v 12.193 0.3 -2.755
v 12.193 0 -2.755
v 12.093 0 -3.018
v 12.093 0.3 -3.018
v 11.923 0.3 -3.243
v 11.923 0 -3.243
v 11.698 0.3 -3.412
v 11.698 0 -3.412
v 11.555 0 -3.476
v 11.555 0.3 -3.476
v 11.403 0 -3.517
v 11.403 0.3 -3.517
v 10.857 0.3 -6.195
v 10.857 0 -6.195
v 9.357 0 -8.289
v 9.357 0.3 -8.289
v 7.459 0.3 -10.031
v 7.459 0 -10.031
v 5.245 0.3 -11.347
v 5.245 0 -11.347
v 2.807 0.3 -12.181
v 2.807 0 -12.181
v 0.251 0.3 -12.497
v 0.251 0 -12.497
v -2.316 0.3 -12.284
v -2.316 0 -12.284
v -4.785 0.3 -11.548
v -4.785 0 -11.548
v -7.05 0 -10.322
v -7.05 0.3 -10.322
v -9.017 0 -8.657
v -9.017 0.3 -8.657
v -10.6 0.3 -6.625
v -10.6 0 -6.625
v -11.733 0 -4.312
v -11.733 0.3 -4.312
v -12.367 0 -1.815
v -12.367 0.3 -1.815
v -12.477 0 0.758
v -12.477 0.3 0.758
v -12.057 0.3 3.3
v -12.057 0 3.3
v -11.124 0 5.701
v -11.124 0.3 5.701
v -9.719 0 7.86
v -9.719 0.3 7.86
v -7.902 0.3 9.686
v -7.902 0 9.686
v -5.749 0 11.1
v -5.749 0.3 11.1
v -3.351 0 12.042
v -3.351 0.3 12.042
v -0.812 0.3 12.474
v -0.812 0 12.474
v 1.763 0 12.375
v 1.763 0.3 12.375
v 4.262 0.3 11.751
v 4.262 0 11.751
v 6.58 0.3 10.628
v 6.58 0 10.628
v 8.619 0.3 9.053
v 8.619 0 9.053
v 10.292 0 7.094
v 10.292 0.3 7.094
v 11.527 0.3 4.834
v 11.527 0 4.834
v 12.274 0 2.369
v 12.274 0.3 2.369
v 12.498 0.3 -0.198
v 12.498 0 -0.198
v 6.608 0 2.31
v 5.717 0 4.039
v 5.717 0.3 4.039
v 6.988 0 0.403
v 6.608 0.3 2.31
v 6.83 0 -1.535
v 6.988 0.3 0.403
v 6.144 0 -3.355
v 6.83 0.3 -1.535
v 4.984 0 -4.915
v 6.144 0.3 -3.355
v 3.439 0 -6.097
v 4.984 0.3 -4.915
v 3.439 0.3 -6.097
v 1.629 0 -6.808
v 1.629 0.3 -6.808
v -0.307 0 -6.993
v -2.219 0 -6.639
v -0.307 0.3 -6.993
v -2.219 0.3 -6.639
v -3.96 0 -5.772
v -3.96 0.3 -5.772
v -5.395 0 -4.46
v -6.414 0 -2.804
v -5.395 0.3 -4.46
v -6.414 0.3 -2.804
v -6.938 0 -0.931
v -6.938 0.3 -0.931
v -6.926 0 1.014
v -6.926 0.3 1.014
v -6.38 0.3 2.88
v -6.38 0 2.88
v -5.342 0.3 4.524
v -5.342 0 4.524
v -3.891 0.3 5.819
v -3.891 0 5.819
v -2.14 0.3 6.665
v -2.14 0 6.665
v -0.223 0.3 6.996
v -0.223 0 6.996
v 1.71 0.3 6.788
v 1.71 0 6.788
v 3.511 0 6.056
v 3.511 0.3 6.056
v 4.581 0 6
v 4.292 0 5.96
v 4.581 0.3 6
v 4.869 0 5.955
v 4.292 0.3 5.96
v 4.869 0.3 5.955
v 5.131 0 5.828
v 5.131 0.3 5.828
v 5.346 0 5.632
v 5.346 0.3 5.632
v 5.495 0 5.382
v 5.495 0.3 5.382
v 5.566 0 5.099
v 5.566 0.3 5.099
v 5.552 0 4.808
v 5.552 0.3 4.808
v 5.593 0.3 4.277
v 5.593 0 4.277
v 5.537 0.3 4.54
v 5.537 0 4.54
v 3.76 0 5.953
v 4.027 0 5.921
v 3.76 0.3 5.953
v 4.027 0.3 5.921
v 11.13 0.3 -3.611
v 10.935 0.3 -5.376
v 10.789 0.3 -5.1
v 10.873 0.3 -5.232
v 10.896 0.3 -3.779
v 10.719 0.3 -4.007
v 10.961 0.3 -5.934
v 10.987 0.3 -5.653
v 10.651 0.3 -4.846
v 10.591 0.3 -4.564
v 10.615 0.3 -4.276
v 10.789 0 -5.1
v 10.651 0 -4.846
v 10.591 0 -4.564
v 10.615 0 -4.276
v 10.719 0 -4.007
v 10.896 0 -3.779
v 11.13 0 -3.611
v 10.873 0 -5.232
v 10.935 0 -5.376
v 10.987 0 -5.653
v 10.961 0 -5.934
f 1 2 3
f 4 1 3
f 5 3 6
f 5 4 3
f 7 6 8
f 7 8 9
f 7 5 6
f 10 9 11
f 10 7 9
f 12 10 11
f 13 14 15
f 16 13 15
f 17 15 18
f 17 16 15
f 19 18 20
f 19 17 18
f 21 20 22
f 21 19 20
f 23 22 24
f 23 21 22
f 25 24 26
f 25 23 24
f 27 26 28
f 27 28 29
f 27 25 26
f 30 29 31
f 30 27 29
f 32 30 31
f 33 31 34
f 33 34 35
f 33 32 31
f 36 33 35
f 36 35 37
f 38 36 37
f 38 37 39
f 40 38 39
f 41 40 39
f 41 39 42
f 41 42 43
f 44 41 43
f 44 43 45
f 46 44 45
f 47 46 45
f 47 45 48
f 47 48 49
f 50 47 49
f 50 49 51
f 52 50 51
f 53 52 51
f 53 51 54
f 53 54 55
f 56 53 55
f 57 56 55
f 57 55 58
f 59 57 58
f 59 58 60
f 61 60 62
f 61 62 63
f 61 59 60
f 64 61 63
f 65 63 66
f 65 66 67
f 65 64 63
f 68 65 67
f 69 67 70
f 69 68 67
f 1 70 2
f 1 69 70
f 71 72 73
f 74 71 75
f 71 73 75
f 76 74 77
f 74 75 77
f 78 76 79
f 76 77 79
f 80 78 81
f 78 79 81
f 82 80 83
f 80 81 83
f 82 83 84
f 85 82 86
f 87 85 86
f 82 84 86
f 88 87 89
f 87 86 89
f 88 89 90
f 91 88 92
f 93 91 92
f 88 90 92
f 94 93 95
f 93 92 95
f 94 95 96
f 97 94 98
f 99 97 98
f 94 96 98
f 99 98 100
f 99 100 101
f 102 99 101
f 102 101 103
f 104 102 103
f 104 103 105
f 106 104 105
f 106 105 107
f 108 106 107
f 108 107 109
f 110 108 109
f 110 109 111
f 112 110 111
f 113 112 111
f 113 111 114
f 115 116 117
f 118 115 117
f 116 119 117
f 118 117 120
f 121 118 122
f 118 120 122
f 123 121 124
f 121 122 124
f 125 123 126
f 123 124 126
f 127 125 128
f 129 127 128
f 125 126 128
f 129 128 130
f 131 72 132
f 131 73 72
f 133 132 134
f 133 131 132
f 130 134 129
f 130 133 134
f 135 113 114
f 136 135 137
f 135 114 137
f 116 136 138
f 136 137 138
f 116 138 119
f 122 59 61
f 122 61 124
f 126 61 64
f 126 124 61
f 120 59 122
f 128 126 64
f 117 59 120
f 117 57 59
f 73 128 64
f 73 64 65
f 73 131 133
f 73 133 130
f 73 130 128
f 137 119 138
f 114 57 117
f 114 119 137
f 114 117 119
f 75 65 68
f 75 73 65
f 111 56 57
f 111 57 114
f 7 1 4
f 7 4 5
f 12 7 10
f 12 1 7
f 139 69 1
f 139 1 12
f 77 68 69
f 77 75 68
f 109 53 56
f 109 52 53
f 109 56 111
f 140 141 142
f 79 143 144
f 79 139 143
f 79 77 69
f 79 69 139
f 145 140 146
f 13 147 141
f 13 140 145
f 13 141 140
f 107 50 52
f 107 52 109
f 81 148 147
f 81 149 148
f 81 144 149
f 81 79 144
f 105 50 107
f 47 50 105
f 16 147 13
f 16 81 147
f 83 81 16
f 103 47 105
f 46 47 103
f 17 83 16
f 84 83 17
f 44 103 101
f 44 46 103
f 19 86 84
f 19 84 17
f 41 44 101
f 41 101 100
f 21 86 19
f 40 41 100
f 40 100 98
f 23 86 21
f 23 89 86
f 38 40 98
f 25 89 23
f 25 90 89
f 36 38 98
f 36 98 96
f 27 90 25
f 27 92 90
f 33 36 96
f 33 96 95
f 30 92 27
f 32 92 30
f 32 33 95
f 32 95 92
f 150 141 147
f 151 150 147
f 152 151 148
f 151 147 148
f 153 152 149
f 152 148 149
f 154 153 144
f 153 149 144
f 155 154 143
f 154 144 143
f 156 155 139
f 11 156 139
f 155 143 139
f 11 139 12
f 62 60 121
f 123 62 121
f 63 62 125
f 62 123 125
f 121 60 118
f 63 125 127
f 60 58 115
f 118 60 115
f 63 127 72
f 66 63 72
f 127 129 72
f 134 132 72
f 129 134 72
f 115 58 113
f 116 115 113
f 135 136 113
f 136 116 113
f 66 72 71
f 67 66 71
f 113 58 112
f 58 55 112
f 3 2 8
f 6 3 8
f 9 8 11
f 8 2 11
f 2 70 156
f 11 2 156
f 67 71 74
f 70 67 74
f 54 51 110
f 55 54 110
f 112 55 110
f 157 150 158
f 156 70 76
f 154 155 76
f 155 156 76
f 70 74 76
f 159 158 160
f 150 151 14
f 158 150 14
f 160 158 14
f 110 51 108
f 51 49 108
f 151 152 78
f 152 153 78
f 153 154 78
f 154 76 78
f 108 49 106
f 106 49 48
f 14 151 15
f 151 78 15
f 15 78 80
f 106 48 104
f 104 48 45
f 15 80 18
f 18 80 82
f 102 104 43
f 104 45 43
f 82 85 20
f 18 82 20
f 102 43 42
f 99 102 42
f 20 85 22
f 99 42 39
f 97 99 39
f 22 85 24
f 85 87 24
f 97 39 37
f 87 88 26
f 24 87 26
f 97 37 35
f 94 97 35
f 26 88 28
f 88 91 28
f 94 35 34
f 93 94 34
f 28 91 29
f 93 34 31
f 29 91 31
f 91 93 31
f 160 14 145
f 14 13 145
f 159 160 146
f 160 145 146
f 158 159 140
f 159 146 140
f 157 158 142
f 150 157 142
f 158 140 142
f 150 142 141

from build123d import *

# Parameters (mm, degrees)
SKETCH1_W          = 5.5
SKETCH1_H          = 0.3
SKETCH2_R          = 1
CUT_EXTRUDE1_DEPTH = 10
FILLET1_R          = 1


with BuildPart() as part:
    # Sketch1 → Revolve1 (revolve)
    with BuildSketch(Plane.XY, mode=Mode.PRIVATE) as revolve1_sk:
        with Locations((-9.75, 0.15)):
            Rectangle(SKETCH1_W, SKETCH1_H)
    revolve(revolve1_sk.sketch.rotate(Axis((0, 0, 0), (0, 1, 0)), 270), axis=Axis((0, 0, 0), (0, 1, 0)))

    # Sketch2 → Cut-Extrude1 (cut)
    with BuildSketch(Plane(origin=(0, 0.3, 0), x_dir=(1, 0, 0), z_dir=(0, 1, 0))):
        with Locations((4.571073678, -5)):
            Circle(SKETCH2_R)
        with Locations((11.589188307, 4.5)):
            Circle(SKETCH2_R)
    extrude(amount=-CUT_EXTRUDE1_DEPTH, mode=Mode.SUBTRACT)

    # Fillet1
    fillet1_edges = [part.edges().sort_by_distance(p)[0] for p in [
        (5.405006845, 0.15, 4.448134553),
        (3.946825109, 0.15, 5.781225783),
        (11.976907898, 0.15, -3.578222631),
        (11.253259969, 0.15, -5.441887547),
    ]]
    fillet(fillet1_edges, radius=FILLET1_R)


solid = part.part
